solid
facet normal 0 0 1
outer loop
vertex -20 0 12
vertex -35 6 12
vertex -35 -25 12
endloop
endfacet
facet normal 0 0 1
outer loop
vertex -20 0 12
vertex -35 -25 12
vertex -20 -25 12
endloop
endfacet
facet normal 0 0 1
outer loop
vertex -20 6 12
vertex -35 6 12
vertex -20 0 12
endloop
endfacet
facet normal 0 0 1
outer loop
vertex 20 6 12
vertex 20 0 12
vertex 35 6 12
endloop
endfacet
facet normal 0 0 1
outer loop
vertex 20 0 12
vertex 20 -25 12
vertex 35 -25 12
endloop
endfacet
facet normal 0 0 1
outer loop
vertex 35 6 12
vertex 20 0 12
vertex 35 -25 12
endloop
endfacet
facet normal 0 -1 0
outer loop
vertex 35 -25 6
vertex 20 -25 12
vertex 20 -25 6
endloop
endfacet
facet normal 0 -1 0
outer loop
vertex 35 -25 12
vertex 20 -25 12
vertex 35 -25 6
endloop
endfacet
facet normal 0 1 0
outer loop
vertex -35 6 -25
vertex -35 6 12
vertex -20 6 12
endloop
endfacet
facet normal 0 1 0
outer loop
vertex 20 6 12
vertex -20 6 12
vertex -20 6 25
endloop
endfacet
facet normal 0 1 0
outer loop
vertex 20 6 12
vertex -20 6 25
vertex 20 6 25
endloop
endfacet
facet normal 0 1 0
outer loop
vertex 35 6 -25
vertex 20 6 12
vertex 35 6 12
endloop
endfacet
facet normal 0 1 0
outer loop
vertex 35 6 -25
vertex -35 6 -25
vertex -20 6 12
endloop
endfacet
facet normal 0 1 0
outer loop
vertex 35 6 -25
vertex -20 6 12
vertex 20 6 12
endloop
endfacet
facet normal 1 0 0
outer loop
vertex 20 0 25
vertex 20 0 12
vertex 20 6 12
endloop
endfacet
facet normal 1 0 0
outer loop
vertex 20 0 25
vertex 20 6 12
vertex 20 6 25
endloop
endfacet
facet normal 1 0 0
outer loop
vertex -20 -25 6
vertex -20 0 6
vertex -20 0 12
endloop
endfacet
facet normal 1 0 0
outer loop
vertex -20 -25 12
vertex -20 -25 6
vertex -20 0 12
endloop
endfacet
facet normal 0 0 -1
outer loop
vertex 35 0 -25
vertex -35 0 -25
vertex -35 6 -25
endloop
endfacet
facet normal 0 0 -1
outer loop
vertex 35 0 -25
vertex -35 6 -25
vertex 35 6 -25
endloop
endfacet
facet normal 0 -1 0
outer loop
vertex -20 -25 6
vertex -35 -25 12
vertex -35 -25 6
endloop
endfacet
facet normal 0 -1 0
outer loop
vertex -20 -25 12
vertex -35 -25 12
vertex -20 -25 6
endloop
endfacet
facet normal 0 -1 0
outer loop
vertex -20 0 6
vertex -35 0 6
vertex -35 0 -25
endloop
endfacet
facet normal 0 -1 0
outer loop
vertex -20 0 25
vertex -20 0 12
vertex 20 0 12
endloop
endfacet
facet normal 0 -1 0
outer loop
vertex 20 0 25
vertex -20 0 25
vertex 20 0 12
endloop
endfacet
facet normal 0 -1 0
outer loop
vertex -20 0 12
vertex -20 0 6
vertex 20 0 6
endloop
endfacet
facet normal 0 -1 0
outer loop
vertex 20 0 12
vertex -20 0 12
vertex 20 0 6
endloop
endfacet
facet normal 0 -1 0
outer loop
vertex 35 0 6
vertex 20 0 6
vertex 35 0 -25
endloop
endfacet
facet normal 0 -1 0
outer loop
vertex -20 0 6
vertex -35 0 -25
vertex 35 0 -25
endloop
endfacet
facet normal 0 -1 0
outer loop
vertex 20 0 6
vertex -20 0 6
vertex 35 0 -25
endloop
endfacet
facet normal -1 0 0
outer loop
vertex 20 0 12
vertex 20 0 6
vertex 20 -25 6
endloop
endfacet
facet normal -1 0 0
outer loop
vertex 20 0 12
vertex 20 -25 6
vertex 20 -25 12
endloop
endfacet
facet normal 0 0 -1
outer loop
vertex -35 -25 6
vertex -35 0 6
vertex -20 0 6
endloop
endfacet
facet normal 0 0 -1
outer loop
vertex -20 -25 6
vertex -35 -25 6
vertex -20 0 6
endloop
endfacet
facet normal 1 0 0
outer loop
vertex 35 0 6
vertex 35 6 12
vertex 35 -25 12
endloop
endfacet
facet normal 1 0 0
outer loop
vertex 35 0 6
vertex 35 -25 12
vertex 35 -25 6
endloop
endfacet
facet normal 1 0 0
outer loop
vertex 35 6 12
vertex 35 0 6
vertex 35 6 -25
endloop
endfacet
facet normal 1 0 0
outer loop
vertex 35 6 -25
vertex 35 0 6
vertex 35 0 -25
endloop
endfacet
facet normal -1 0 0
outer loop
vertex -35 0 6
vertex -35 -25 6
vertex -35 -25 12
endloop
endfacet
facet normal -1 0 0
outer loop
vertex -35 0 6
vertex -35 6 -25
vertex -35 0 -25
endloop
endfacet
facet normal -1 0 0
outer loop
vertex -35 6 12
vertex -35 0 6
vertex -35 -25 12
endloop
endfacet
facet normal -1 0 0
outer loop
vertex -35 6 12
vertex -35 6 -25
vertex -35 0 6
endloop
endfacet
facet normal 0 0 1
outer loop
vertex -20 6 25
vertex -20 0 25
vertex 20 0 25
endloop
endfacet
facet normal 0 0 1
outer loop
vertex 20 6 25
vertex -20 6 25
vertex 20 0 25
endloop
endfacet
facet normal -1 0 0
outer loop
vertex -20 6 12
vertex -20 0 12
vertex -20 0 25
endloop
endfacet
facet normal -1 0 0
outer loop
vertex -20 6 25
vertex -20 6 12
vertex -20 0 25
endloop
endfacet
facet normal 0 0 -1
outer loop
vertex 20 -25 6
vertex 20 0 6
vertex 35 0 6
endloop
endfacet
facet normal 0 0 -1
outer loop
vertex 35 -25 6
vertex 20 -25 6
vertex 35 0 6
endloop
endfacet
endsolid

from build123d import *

# Parameters (mm, degrees)
SKETCH1_W           = 70
SKETCH1_H           = 50
BOSS_EXTRUDE1_DEPTH = 6
CUT_EXTRUDE1_DEPTH  = 44.428101501
SKETCH3_W           = 15
SKETCH3_H           = 6
BOSS_EXTRUDE2_DEPTH = 25


with BuildPart() as part:
    # Sketch1 → Boss-Extrude1 (new body)
    with BuildSketch(Plane(origin=(0, 0, 0), x_dir=(1, 0, 0), z_dir=(0, 1, 0))):
        Rectangle(SKETCH1_W, SKETCH1_H)
    extrude(amount=BOSS_EXTRUDE1_DEPTH)

    # Sketch2 → Cut-Extrude1 (cut, through all)
    with BuildSketch(Plane.XZ):
        Polygon((-35, 12), (-20, 12), (-20, 37.174487296), (-39.665128523, 37.174487296), (-39.665128523, 12), align=None)
        Polygon((39.665128523, 12), (35, 12), (20, 12), (20, 37.174487296), (39.665128523, 37.174487296), align=None)
    extrude(amount=-CUT_EXTRUDE1_DEPTH, mode=Mode.SUBTRACT)

    # Sketch3 → Boss-Extrude2 (add)
    with BuildSketch(Plane.XZ):
        with Locations((-27.5, 9)):
            Rectangle(SKETCH3_W, SKETCH3_H)
        with Locations((27.5, 9)):
            Rectangle(SKETCH3_W, SKETCH3_H)
    extrude(amount=BOSS_EXTRUDE2_DEPTH)


solid = part.part
